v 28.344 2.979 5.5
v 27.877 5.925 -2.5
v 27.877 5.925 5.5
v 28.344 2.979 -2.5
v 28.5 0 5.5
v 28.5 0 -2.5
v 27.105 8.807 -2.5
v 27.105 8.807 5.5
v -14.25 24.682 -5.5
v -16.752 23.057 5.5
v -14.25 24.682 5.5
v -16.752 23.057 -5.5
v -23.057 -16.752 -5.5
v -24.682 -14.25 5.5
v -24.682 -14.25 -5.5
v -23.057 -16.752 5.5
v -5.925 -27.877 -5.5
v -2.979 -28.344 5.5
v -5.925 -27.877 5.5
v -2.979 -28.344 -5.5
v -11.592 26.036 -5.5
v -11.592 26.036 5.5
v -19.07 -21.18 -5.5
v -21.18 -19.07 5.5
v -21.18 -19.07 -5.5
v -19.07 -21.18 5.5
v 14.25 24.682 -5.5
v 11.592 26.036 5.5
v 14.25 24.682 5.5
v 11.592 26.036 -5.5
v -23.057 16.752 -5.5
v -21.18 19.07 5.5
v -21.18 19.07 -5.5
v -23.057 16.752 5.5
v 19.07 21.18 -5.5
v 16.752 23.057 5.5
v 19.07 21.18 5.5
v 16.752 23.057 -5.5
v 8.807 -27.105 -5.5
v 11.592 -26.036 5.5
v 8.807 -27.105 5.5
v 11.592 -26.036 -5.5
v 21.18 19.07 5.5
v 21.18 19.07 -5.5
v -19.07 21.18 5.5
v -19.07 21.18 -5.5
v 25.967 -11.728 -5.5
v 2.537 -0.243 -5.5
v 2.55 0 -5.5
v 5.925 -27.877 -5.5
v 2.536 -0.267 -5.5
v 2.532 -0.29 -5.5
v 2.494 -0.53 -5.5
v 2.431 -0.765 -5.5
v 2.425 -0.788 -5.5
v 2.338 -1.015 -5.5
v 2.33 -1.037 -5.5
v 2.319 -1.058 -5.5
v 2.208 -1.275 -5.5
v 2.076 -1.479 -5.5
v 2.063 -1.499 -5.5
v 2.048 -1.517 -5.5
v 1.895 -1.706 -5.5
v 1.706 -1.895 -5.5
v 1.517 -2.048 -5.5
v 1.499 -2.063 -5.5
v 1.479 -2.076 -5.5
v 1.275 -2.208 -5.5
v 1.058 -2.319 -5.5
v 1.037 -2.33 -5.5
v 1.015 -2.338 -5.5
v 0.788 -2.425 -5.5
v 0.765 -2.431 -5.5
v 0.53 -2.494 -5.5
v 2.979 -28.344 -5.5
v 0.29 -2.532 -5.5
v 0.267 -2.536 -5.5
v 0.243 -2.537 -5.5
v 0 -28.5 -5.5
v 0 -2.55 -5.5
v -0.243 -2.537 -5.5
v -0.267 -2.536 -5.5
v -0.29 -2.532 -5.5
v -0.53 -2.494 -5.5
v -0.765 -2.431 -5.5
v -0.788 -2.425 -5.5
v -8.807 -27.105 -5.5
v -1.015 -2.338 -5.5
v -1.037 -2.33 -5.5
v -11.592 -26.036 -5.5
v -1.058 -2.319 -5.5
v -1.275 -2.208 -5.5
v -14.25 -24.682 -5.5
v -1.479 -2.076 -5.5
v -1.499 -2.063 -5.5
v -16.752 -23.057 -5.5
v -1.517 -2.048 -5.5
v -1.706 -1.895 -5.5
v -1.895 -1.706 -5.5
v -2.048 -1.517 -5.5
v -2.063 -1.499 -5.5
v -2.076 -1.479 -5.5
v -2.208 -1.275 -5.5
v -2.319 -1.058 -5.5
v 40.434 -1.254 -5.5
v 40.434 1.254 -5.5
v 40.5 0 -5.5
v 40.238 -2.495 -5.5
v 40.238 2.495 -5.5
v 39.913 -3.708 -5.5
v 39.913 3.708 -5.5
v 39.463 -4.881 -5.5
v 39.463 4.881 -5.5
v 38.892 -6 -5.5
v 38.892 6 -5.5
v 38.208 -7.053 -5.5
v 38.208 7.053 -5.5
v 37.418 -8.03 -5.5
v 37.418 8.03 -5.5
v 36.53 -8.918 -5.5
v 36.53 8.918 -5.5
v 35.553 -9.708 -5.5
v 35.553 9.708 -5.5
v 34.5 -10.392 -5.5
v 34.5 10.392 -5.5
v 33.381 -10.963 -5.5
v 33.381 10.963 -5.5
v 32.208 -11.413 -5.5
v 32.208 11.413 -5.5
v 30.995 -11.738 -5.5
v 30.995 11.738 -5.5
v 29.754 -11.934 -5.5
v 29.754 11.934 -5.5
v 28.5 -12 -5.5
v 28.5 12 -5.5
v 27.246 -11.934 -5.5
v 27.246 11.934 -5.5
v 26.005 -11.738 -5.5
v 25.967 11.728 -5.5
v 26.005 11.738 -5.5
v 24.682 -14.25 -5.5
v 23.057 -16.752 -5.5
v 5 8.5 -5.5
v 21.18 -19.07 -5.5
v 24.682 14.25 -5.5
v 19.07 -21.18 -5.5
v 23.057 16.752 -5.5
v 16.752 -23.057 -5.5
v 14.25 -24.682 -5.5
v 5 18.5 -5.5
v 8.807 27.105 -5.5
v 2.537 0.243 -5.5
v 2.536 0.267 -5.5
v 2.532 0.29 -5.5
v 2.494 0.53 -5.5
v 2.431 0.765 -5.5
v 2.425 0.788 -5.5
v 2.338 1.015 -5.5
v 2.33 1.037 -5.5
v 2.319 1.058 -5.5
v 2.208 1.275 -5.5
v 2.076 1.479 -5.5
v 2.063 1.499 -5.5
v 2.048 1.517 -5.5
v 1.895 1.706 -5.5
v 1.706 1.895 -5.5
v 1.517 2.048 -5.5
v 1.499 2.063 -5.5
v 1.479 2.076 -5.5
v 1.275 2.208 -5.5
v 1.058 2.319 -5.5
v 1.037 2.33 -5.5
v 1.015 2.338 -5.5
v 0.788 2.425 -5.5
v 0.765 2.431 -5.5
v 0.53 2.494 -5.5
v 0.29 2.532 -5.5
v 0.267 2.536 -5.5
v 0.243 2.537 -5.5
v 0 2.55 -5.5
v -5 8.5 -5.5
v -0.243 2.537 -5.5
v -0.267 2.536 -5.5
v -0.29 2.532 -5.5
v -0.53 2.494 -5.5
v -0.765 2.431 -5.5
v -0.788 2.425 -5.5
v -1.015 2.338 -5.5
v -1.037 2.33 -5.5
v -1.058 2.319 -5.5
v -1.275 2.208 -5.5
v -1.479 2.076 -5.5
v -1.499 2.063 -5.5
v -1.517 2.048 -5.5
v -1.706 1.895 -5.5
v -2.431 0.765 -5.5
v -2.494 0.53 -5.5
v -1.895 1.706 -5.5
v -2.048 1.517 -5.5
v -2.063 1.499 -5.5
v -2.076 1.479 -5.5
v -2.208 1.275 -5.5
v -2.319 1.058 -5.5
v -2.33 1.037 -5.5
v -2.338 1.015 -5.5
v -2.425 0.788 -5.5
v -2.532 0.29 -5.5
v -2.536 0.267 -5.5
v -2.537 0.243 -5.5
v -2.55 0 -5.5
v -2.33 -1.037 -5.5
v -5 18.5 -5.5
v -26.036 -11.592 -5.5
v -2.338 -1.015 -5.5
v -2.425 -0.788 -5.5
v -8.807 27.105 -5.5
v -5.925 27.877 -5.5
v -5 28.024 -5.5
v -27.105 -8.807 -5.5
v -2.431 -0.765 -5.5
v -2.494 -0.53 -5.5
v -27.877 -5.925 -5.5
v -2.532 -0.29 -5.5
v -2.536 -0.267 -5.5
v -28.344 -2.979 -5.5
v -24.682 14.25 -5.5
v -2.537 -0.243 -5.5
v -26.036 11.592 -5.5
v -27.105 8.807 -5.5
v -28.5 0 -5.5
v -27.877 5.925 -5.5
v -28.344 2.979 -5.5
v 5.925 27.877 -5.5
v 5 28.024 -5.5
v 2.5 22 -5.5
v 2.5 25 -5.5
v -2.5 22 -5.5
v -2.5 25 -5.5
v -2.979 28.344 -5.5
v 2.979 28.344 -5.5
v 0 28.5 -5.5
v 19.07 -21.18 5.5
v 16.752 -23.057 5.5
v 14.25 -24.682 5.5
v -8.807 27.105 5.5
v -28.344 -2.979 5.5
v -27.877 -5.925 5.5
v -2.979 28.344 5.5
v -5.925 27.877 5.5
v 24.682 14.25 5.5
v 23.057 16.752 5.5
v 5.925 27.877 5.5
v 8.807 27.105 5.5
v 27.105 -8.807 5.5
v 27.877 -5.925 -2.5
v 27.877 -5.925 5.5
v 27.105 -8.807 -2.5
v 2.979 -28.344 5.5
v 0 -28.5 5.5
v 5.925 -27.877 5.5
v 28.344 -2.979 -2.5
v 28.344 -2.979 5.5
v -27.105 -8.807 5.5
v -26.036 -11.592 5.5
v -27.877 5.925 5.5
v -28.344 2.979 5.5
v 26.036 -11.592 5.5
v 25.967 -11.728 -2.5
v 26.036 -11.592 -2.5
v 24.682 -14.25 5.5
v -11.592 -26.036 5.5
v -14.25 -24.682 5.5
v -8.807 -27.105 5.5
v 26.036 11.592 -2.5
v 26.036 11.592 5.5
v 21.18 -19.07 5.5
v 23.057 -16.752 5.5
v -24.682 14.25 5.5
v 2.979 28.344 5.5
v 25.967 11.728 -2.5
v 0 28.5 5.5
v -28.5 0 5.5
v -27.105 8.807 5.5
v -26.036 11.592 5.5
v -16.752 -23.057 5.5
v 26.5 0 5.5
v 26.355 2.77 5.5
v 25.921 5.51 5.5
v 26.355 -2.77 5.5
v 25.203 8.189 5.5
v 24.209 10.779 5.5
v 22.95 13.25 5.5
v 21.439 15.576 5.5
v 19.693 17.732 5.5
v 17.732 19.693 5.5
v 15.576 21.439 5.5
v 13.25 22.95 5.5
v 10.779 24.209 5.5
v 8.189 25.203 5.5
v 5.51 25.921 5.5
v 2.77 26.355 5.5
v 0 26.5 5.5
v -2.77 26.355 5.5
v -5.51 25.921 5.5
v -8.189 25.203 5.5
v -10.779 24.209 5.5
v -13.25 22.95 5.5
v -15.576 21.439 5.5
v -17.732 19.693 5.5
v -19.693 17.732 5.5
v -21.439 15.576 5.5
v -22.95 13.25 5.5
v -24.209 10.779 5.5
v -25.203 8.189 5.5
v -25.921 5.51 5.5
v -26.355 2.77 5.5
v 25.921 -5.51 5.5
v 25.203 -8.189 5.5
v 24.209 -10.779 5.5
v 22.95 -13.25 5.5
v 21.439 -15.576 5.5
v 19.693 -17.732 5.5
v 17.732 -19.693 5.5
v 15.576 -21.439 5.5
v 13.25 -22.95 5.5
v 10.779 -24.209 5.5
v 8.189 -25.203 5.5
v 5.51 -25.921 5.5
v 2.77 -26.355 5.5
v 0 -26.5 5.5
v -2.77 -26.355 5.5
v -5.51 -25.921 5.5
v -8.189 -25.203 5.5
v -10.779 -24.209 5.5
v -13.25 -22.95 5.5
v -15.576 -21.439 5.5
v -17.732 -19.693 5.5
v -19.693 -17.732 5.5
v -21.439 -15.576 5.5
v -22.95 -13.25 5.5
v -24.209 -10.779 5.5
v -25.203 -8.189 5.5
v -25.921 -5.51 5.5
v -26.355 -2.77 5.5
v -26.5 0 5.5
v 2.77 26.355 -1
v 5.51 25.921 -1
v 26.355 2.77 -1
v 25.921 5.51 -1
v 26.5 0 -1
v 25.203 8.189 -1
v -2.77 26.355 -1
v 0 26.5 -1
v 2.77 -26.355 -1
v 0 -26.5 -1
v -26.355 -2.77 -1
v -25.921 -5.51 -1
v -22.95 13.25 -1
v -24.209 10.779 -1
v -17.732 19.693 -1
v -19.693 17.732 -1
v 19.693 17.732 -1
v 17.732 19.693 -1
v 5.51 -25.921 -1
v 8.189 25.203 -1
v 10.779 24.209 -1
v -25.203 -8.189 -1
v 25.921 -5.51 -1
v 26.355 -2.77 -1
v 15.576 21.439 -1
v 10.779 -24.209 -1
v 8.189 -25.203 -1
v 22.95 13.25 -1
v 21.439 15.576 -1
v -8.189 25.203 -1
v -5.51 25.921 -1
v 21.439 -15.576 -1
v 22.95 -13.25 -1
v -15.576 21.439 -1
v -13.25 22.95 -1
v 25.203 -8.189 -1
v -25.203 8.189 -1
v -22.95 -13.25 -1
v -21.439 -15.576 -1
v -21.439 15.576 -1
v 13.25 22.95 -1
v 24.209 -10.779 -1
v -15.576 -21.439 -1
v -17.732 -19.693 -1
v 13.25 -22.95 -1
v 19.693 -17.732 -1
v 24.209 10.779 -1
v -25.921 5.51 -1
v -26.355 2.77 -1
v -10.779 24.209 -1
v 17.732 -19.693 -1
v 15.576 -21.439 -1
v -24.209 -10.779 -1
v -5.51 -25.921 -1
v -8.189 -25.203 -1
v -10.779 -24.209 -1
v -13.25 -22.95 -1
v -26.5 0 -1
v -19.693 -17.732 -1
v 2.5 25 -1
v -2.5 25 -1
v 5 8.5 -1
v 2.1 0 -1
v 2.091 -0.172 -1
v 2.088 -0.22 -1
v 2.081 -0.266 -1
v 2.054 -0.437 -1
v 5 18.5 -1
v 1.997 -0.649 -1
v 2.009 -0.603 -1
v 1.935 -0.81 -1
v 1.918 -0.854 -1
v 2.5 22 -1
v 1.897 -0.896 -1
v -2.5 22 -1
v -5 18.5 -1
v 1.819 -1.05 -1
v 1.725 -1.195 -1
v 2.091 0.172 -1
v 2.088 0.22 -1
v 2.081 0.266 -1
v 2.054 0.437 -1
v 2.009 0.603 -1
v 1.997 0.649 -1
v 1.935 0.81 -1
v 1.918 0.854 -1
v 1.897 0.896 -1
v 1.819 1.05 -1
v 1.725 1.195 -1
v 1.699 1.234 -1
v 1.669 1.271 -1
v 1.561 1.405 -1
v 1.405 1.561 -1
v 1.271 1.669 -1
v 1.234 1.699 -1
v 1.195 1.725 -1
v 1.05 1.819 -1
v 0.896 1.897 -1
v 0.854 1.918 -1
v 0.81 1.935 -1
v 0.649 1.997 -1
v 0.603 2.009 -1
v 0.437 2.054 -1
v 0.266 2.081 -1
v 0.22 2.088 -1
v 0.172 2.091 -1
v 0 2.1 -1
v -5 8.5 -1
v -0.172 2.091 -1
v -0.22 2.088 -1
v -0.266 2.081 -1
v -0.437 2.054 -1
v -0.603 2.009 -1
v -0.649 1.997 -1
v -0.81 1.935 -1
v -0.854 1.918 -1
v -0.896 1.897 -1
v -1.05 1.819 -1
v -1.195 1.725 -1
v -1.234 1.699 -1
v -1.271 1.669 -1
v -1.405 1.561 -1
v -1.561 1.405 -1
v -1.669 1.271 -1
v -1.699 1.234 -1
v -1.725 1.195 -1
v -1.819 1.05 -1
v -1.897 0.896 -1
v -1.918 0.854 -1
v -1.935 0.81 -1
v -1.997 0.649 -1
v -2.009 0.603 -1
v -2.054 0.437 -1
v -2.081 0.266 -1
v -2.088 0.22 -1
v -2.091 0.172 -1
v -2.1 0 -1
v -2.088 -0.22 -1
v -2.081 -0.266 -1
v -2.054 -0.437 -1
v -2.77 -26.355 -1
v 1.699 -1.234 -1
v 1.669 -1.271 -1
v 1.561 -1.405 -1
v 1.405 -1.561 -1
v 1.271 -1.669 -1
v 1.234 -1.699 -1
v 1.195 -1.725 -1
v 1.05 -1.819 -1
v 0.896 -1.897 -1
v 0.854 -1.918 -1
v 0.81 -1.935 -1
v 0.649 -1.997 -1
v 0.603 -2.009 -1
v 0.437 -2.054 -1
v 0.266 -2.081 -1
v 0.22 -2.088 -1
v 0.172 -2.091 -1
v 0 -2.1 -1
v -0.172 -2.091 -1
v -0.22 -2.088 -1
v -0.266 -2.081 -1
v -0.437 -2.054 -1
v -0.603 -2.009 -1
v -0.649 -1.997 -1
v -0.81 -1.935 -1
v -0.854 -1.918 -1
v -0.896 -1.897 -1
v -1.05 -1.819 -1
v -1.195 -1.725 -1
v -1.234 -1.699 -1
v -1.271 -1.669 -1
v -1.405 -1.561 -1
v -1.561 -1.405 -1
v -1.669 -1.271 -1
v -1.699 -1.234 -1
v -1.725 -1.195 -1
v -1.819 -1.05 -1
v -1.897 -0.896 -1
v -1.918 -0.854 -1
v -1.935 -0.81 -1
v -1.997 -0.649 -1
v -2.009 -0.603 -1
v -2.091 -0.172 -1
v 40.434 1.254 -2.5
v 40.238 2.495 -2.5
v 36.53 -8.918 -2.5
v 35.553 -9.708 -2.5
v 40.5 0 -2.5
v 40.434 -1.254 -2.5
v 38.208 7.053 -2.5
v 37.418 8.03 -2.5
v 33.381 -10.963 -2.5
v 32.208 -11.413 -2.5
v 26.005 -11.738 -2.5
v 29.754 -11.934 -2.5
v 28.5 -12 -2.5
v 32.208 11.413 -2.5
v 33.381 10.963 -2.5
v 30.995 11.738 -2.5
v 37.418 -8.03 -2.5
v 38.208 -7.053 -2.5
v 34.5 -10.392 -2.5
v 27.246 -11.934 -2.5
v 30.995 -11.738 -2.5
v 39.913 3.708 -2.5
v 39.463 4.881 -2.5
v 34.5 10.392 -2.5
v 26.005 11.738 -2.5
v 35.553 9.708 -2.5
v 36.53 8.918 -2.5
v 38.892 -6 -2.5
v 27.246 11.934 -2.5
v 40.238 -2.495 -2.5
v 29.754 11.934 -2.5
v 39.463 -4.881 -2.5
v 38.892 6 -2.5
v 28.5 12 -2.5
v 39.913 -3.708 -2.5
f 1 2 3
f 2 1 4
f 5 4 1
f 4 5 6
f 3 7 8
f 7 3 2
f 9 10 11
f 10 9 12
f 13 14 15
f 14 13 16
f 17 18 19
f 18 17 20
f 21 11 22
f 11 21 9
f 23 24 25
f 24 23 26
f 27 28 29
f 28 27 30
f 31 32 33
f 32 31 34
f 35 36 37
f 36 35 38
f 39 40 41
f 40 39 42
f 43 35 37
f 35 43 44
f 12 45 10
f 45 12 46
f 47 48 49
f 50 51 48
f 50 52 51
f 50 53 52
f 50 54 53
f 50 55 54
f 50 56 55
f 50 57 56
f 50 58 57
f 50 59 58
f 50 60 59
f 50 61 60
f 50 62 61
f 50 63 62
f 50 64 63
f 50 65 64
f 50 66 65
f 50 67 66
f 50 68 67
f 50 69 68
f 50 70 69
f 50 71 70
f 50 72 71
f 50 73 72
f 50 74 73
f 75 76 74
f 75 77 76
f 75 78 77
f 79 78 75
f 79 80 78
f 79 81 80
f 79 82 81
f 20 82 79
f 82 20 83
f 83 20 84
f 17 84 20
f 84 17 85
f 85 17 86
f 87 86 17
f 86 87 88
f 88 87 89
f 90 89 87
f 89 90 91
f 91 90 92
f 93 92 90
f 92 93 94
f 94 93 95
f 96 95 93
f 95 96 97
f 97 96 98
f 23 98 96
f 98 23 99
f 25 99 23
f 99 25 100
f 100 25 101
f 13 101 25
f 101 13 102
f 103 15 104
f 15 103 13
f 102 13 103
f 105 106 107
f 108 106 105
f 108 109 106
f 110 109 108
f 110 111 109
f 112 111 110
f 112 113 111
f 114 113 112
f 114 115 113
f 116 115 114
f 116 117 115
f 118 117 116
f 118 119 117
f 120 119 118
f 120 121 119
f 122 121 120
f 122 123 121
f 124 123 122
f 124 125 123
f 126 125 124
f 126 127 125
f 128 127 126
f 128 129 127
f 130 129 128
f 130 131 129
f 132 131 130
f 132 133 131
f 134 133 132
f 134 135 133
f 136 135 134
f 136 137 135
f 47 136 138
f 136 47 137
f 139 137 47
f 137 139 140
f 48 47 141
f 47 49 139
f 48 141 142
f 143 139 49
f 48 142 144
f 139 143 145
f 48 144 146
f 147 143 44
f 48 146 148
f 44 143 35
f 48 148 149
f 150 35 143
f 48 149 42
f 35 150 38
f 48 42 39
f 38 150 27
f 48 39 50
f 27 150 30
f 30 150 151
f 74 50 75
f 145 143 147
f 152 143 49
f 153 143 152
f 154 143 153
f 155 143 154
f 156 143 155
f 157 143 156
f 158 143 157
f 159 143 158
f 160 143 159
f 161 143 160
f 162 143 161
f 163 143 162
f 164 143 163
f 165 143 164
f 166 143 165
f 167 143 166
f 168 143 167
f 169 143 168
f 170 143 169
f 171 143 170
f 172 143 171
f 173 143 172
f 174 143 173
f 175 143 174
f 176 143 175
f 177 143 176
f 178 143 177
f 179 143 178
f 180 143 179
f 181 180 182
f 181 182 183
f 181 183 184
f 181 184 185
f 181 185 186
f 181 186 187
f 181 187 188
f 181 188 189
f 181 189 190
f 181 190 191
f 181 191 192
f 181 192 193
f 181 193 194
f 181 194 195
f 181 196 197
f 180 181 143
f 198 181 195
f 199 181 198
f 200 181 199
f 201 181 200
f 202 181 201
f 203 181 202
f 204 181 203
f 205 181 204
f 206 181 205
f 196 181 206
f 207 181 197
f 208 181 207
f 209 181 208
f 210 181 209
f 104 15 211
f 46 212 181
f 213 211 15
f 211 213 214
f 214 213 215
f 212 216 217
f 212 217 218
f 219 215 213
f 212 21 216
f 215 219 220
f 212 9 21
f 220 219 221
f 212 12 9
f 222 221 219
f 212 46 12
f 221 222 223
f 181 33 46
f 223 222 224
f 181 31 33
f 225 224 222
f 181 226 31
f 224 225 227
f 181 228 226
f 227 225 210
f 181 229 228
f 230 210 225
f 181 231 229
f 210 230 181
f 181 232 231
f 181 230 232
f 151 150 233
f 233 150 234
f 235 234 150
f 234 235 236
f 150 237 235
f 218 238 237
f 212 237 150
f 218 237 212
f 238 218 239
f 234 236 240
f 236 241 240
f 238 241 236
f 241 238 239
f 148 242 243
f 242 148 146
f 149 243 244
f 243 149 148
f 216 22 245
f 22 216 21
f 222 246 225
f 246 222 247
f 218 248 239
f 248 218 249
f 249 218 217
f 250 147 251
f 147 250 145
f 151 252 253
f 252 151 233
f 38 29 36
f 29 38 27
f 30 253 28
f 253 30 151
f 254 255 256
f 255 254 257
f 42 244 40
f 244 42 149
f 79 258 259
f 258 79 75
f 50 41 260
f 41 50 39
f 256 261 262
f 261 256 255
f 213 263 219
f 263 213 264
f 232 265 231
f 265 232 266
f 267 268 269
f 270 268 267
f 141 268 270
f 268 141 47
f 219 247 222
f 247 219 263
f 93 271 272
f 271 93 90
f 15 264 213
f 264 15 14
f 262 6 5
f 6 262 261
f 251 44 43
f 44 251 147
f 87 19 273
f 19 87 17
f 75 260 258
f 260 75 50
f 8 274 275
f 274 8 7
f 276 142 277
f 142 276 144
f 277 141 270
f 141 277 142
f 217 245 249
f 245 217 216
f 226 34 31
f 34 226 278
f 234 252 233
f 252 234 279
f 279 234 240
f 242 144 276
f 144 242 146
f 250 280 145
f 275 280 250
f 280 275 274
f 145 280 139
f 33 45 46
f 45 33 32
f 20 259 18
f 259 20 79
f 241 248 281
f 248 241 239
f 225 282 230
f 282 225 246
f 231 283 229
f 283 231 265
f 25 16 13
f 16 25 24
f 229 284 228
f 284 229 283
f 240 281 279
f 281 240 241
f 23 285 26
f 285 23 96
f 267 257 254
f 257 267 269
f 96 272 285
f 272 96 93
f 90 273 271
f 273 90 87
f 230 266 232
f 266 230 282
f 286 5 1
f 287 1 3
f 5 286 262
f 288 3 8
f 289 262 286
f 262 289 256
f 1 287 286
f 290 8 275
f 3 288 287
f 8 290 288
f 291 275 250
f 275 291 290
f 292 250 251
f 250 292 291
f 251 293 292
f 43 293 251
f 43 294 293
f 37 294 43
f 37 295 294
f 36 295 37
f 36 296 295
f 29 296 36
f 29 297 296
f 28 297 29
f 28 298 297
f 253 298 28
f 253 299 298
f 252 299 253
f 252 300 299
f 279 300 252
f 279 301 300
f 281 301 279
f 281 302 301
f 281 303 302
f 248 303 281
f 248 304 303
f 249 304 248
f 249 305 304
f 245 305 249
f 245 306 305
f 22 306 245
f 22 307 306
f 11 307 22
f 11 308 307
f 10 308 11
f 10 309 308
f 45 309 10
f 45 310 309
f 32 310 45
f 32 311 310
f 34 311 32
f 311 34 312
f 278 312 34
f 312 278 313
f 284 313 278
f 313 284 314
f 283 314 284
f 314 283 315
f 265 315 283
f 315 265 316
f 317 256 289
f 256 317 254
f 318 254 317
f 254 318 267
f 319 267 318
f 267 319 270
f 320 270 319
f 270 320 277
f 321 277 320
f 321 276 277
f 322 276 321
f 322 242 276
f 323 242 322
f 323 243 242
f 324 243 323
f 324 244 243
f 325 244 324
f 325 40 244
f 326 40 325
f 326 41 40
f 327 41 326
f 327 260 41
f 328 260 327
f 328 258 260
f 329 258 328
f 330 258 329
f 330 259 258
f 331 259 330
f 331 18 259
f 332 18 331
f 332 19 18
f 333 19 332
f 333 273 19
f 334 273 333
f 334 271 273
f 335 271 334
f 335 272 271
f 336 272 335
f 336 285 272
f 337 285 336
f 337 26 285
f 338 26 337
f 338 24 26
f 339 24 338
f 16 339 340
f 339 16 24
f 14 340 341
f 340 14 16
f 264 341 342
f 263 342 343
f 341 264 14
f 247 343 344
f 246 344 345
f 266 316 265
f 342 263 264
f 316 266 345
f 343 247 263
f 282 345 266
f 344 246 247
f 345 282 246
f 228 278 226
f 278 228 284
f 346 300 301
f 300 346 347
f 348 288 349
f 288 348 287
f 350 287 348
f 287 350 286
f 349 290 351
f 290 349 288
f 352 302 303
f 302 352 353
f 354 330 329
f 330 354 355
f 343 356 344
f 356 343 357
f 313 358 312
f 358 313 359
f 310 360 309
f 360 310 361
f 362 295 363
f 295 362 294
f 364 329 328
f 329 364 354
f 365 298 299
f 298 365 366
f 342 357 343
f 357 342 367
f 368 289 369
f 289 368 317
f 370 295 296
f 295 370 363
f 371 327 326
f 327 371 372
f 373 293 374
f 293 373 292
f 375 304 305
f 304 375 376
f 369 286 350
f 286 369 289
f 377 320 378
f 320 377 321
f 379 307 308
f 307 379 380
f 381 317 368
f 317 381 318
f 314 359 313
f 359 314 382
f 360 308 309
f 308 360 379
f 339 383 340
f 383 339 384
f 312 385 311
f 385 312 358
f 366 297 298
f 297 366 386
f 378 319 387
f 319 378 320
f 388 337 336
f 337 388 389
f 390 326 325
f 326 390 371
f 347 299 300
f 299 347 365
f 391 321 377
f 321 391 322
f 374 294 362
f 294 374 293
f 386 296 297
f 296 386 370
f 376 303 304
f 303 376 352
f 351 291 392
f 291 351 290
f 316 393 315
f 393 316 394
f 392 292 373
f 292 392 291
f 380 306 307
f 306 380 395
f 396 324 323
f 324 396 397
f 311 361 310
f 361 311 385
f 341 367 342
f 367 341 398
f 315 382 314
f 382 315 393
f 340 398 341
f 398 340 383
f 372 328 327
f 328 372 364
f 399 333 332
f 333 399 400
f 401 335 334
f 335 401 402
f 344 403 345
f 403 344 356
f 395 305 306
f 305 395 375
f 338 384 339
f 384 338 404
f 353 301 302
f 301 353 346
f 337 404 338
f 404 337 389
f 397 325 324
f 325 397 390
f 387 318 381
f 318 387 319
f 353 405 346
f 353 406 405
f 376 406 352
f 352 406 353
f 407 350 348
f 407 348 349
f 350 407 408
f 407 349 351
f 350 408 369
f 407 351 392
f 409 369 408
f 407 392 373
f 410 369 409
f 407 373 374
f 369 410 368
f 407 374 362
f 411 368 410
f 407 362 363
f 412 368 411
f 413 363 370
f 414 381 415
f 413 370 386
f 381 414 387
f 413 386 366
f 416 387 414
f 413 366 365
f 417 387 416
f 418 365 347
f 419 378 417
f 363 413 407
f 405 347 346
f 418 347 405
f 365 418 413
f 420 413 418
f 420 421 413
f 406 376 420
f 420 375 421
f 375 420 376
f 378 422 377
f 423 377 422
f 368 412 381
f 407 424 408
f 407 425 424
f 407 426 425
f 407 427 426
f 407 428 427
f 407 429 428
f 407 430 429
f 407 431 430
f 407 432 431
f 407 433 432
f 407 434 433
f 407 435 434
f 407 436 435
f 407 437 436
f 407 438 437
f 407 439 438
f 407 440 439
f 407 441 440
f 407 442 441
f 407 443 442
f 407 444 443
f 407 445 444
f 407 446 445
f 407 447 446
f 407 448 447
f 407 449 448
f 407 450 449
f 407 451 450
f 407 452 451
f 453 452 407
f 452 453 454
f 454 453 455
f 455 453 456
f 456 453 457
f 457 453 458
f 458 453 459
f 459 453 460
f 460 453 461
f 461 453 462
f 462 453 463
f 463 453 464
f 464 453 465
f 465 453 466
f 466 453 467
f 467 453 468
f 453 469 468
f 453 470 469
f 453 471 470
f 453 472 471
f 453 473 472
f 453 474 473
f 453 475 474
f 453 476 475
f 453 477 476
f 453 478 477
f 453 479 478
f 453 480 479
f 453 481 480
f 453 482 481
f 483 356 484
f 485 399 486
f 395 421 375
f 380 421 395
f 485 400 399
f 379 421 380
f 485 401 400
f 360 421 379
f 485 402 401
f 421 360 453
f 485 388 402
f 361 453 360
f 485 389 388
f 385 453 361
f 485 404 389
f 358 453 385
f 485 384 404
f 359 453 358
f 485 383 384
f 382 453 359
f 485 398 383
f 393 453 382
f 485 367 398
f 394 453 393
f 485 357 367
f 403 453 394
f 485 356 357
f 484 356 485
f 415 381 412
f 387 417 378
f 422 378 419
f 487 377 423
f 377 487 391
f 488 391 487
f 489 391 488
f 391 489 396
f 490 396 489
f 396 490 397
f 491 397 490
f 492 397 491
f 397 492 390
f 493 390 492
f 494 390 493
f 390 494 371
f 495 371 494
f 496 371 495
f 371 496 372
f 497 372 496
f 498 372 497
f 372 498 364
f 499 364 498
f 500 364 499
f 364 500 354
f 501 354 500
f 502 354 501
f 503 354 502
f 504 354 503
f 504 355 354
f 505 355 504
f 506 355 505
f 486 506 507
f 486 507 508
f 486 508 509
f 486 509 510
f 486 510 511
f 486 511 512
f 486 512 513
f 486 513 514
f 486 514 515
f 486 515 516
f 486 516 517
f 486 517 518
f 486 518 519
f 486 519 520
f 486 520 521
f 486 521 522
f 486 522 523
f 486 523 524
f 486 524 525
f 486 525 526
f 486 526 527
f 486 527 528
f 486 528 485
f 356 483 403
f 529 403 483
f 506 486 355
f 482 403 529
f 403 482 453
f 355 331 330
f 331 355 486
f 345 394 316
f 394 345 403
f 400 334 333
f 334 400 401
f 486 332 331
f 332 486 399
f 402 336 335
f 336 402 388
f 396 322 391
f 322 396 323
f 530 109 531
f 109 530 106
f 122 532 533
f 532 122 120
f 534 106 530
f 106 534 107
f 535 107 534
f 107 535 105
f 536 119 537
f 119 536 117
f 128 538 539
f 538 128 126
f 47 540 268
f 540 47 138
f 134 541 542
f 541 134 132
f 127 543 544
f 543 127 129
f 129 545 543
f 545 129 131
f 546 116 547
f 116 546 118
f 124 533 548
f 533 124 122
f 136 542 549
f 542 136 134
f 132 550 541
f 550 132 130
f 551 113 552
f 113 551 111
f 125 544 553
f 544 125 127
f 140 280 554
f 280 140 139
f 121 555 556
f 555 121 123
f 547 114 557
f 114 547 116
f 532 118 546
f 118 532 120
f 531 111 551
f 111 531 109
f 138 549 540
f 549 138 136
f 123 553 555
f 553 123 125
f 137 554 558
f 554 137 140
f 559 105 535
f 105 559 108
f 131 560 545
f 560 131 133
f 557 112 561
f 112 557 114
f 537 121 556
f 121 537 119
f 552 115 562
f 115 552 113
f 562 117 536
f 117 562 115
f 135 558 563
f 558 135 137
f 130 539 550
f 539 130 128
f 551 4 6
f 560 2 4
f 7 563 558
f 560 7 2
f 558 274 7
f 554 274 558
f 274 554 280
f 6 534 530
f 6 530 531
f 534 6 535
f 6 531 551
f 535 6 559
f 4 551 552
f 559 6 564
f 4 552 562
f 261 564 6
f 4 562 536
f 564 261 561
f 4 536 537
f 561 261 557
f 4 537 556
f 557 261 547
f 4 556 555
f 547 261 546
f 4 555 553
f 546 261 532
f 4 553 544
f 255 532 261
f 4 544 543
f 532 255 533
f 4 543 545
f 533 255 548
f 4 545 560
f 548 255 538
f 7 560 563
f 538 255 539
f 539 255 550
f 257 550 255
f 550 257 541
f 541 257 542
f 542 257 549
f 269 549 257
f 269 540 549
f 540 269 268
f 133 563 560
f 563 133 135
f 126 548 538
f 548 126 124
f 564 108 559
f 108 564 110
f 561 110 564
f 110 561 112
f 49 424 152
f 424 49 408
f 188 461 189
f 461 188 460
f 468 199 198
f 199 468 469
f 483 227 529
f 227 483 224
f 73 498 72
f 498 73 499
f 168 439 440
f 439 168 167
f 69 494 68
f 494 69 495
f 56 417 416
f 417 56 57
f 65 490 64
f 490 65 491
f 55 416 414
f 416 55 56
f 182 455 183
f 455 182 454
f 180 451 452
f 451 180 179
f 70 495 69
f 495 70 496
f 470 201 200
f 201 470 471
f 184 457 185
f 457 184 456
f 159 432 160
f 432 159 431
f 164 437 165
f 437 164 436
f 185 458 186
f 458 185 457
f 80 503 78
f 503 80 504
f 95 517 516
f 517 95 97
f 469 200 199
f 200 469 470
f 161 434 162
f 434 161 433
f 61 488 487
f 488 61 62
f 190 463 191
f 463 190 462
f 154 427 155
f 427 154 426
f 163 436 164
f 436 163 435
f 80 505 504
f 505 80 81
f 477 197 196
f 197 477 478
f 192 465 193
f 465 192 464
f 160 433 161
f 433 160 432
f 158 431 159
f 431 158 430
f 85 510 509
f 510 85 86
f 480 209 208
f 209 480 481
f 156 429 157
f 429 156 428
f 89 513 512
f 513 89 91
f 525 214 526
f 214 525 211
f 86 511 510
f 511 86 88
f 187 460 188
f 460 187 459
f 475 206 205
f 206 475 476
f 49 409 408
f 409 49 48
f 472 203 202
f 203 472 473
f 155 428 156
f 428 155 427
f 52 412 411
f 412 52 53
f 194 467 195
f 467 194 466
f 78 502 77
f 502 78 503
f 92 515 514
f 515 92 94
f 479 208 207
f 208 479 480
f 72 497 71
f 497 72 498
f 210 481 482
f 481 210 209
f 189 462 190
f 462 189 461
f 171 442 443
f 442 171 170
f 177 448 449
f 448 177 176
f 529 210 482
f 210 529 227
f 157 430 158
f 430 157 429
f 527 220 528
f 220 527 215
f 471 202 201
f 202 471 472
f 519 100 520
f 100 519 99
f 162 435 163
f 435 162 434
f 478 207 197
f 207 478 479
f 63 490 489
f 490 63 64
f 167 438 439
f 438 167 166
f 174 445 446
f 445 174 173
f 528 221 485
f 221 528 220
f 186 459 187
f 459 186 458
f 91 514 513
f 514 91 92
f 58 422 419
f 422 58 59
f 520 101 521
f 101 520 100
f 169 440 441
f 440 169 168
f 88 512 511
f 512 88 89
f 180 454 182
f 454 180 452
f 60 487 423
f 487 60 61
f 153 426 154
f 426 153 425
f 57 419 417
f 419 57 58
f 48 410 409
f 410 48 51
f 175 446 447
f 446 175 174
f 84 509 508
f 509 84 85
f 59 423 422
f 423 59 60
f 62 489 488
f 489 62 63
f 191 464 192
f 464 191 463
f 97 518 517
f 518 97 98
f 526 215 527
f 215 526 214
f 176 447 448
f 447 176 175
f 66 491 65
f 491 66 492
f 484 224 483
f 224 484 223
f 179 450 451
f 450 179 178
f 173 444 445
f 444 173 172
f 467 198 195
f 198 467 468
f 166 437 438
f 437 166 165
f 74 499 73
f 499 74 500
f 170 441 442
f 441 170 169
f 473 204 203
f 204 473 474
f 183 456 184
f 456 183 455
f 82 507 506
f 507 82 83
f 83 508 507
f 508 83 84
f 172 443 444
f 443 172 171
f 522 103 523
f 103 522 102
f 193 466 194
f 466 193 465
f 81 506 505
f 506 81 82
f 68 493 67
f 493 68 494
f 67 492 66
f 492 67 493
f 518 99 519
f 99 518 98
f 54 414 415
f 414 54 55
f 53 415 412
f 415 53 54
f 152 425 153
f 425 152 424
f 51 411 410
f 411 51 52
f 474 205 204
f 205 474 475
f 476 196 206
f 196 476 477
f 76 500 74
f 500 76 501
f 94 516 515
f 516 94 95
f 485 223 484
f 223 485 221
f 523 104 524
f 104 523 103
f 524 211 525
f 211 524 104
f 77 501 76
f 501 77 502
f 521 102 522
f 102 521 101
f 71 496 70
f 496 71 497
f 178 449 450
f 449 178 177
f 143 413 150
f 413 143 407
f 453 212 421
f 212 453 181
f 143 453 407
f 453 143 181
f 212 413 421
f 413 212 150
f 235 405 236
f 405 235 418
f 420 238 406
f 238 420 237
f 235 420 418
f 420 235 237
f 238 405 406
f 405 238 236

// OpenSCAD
module cap3d(outer_radius=20, height=10, walls_thickness=2, top_thickness=-1){
    /* module for round lid cap*/
    top_thickness = top_thickness <=0 ? walls_thickness : top_thickness;
    r_outer = outer_radius;
    h_outer = height;
    r_inner = outer_radius - walls_thickness;
    h_inner = height - top_thickness;
    inner_z_offset = top_thickness;
    
    difference(){
        color("blue")cylinder(h=h_outer ,r=r_outer ,center=true); //outer
        translate([0,0,top_thickness]) color("red")cylinder(h=h_inner ,r=r_inner ,center=true); //inner
        }//difference
    } //module
  
module cup(){
    difference(){
        union(){
            cap3d(outer_radius=57/2, height=11, walls_thickness=2, top_thickness=3);
            translate([57/2,0,-11/2+2/1-0.5]) cap3d(outer_radius=12, height=3, walls_thickness=12, top_thickness=3);
        }//union
    cylinder(20,3, center=true);
    }//difference
}//module

module suction_piping_housing(){
        union(){
            translate([0,0,0]) color("blue") cube([10,30,10], center=true);
            translate([0,10,13]) color("blue") cube([10,10,14+3], center=true);
            translate([0,-0,7]) color("black") cube([5,3,5], center=true);
        }//union
    
    }//module

module suction_piping(){
    difference(){
        suction_piping_housing();
        union(){
            translate([0,-2.5,0]) rotate ([90,0,0]) color("red") cylinder(h=31,d=8.1,center=true);
            translate([0,10,14.5]) rotate ([0,0,0]) color("red") cylinder(h=29,d=6.1,center=true);
        }//union
    }//difference
}//module

module cup_with_holes(){
    difference(){
        cup();
        translate([0,40-28.5+12,-10.5]) mirror([-0,-1,0]) suction_piping_housing(); 
    }//difference
}//module




$fn=60;
cup_with_holes();
//suction_piping();


//rentgen sight of a cup itself
/*
difference(){
    difference(){cup();translate([0,40-28.5+12,-10.5]) mirror([-0,-1,0]) suction_piping_housing(); }
    translate([0,0,-10])cube([70,120,80]);}
*/

/*
// rentgen sight of pipe
difference(){
    union(){cup();translate([0,40-28.5+12,-10.5]) mirror([-0,-1,0]) suction_piping(); }
    translate([0,0,-10])cube([70,120,80]);}

*/
